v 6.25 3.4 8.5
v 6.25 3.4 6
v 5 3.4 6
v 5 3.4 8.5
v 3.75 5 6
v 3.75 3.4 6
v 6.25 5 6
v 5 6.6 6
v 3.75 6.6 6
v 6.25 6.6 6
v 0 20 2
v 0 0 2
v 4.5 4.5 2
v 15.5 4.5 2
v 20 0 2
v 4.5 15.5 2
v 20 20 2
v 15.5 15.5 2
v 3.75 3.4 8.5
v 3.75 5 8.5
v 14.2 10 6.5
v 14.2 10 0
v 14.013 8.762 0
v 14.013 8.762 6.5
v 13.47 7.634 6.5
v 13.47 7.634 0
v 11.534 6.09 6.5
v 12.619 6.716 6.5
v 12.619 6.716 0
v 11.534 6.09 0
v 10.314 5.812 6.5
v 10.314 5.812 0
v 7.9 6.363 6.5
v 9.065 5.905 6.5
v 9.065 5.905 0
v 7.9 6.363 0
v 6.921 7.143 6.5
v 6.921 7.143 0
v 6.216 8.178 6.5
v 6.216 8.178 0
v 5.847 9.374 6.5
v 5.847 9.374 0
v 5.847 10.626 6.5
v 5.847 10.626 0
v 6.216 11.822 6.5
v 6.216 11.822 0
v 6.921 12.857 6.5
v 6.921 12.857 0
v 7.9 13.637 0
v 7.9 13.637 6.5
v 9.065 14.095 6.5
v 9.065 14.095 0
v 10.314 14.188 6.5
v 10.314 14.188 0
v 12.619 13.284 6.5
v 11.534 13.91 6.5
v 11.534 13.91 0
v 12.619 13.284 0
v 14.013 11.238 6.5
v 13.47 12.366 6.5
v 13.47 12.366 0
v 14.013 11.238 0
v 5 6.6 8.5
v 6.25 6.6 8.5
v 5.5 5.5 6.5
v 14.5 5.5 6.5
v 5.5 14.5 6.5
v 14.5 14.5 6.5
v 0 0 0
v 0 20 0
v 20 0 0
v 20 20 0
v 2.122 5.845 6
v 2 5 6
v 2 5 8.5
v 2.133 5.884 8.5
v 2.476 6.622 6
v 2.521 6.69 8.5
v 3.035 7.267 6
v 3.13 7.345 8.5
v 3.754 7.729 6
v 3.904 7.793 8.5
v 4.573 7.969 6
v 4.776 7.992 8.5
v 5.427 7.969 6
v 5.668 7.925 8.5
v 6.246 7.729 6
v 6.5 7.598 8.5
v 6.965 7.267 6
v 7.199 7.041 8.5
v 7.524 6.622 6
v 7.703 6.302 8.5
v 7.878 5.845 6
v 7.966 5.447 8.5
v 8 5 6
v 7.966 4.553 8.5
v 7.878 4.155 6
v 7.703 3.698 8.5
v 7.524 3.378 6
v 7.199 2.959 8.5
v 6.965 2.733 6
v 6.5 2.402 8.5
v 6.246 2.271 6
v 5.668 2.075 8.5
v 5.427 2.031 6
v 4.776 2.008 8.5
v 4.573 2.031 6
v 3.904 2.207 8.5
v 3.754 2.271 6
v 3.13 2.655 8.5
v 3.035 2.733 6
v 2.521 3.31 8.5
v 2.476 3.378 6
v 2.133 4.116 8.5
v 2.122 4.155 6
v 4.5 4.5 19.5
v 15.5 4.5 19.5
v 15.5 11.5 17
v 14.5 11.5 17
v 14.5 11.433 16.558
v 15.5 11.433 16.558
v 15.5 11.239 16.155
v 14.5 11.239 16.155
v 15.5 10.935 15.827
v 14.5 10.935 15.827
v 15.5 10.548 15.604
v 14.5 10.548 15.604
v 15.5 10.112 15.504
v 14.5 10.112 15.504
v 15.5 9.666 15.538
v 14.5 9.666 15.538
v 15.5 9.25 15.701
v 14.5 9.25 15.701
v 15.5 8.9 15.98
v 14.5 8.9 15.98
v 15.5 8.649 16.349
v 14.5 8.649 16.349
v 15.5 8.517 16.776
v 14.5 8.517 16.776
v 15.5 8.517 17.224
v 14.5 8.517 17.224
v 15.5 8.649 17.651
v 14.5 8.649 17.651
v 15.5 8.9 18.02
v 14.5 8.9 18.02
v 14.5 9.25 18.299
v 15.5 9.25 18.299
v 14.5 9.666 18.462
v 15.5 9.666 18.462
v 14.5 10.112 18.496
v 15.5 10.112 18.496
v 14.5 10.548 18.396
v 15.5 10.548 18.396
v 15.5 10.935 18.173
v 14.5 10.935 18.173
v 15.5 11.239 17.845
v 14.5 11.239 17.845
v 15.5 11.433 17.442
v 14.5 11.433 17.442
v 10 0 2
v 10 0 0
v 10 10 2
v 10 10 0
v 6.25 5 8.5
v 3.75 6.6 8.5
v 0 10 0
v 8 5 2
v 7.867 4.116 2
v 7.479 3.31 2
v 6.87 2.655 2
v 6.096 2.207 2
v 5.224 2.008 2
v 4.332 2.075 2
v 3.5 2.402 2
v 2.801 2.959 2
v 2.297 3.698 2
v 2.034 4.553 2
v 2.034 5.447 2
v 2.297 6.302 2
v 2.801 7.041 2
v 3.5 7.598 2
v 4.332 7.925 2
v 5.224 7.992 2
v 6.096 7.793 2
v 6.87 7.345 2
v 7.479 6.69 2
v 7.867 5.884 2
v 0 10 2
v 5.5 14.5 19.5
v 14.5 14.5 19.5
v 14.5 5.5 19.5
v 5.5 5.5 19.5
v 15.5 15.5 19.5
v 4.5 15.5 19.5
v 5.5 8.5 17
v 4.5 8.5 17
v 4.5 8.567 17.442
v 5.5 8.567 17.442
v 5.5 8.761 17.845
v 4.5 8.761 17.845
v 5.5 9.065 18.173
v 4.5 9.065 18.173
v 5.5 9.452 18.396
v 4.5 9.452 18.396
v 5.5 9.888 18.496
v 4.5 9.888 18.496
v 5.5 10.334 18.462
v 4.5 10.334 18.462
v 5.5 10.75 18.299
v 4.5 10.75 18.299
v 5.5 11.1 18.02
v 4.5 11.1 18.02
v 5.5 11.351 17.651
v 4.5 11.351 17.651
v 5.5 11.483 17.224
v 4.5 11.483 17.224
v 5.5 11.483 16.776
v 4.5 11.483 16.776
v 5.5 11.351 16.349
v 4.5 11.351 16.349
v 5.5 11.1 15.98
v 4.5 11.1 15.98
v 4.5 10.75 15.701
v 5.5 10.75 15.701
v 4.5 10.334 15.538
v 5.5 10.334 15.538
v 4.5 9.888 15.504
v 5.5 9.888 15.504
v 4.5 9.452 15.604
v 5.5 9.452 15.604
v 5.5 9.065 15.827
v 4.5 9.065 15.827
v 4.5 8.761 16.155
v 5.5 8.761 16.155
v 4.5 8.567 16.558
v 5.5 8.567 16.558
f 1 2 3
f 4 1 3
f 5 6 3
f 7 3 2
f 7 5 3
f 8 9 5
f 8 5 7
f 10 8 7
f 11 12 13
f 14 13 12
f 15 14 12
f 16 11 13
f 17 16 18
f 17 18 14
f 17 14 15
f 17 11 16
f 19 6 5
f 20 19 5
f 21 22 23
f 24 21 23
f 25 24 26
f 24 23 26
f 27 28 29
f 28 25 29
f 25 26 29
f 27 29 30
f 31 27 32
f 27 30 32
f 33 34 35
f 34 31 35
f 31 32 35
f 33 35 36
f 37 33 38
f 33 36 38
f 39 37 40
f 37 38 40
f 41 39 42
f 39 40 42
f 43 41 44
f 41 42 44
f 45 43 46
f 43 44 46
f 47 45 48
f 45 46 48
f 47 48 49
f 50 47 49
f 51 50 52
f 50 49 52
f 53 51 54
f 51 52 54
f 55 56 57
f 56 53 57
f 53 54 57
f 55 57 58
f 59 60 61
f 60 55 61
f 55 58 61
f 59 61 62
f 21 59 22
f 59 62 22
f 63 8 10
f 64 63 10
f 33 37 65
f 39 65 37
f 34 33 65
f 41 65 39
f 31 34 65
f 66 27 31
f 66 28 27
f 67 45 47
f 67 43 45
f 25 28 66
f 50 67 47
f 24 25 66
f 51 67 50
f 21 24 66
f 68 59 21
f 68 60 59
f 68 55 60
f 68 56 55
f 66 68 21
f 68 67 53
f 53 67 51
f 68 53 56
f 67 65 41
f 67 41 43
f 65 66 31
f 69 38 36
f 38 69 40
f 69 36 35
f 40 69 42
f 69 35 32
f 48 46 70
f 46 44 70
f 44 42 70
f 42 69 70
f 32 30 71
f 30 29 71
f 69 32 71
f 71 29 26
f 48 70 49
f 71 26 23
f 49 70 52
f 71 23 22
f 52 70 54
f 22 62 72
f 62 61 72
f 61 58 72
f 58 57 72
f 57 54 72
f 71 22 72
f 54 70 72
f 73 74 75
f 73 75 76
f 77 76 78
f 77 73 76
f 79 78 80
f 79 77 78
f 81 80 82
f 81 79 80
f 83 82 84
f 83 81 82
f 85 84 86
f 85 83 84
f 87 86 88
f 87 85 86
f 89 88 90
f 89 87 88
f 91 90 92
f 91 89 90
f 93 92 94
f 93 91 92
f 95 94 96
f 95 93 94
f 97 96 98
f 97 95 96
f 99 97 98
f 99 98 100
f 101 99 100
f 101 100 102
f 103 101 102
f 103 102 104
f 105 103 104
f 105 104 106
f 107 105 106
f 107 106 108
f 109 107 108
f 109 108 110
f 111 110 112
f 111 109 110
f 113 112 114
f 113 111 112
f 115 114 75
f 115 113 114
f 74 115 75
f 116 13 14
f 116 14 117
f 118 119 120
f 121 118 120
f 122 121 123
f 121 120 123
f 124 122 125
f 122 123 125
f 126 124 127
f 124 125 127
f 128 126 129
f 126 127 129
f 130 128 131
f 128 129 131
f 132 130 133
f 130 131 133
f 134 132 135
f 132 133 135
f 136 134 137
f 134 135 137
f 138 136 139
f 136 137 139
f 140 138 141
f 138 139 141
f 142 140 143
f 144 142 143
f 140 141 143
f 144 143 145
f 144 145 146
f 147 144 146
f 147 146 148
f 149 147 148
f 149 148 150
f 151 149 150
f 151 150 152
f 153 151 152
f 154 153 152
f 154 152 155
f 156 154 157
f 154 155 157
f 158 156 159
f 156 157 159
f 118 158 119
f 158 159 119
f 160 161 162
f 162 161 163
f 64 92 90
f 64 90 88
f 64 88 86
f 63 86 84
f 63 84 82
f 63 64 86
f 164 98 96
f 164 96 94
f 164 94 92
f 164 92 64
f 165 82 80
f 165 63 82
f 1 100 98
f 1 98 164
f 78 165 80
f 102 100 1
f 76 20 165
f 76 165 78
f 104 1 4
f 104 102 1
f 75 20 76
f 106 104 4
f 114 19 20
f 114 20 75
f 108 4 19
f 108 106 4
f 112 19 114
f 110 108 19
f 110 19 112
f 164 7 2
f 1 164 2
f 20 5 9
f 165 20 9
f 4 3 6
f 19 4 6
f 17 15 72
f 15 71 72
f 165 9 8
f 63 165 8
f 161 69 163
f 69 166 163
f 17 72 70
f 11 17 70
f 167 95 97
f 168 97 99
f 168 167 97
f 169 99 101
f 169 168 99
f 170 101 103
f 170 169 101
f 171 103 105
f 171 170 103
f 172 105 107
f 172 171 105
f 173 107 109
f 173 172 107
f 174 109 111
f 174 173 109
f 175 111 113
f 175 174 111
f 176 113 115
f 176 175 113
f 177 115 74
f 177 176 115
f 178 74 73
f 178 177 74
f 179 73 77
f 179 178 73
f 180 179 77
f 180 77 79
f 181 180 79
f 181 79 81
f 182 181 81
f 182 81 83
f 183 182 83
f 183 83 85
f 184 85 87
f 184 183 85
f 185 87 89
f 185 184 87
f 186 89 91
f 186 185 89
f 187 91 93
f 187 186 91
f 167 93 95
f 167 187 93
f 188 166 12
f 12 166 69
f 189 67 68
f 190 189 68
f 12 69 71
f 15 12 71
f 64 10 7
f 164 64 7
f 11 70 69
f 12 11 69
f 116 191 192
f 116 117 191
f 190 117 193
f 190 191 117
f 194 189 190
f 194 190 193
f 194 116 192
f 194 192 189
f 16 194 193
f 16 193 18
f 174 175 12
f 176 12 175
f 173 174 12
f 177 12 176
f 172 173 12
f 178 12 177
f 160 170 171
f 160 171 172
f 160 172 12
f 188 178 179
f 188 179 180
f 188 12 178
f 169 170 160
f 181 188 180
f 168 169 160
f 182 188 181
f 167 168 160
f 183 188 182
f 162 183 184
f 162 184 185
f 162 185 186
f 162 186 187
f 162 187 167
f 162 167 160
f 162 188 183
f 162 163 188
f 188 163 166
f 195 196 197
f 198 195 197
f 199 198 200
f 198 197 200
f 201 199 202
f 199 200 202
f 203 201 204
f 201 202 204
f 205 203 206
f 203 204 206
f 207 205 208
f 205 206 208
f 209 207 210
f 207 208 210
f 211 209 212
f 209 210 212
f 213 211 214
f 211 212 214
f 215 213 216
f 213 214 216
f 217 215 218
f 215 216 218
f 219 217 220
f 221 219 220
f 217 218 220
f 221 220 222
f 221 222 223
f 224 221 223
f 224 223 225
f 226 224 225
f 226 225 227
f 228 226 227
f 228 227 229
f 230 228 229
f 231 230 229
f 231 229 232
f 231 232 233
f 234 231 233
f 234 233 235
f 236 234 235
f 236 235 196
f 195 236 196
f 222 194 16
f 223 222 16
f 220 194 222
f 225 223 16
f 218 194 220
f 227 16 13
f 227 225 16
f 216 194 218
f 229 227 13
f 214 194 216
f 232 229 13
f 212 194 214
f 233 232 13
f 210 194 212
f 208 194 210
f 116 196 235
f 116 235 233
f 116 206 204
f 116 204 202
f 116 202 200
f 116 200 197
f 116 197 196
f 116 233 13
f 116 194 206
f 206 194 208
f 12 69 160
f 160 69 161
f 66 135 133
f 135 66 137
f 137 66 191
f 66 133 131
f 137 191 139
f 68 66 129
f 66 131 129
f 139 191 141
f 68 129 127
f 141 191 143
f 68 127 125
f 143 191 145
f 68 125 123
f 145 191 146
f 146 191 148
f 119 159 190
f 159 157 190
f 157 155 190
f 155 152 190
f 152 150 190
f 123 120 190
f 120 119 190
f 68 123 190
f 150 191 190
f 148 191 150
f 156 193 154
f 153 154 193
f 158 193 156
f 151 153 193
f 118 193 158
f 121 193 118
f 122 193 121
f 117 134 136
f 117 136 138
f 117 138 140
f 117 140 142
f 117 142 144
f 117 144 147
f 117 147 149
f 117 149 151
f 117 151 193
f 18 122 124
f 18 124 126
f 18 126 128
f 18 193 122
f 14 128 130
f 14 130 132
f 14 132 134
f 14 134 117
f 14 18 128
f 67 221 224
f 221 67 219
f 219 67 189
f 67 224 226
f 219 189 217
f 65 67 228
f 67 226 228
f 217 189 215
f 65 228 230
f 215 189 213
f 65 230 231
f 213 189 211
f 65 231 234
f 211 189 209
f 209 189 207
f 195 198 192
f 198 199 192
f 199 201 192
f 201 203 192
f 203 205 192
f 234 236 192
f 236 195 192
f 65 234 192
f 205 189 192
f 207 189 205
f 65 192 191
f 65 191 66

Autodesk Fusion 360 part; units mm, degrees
sketch "Sketch1" plane through (0, 0, 0) normal (0, 0, 1) x (1, 0, 0)
  line L0 (0, 0) -> (10, 0)
  line L1 (10, 0) -> (10, 10)
  line L2 (10, 10) -> (0, 10)
  line L3 (0, 10) -> (0, 0)
  circle A0 centre (5, 5) radius 3
  dimension "d1" = 10
  dimension "d2" = 10
  dimension "d3" = 6
extrude "Extrude1" add sketch "Sketch1" along normal blind 2 contours L0 L1 L2 L3 | A0 makes body 1
extrude "Extrude2" add sketch "Sketch1" along normal blind 6 contours A0 bodies 1
sketch "Sketch2" plane through (0, 0, 6) normal (0, 0, 1) x (-1, 0, 0)
  circle A0 centre (-5, -5) radius 3
  line L0 (-5, -5) -> (-6.25, -5)
  line L1 (-6.25, -5) -> (-6.25, -3.4)
  line L2 (-6.25, -3.4) -> (-5, -3.4)
  line L3 (-5, -3.4) -> (-5, -5)
  line L4 (-5, -5) -> (-3.75, -5)
  line L5 (-3.75, -5) -> (-3.75, -6.6)
  line L6 (-3.75, -6.6) -> (-5, -6.6)
  line L7 (-5, -6.6) -> (-5, -5)
  line L8 (-3.75, -6.6) -> (-6.25, -6.6)
  line L9 (-6.25, -6.6) -> (-6.25, -3.4)
  line L10 (-6.25, -3.4) -> (-3.75, -3.4)
  line L11 (-3.75, -3.4) -> (-3.75, -6.6)
  dimension "d8" = 1.25
  dimension "d9" = 1.6
  dimension "d10" = 1.6
extrude "Extrude3" add sketch "Sketch2" along normal blind 2.5 bodies 1
copy_body "Body->Comp1" bodies 1 removing the originals makes body 2 in component "Button"
sketch "Sketch1 (2)" plane through (0, 0, 0) normal (0, 0, 1) x (1, 0, 0) in component "Top"
  line L0 (0, 0) -> (20, 0)
  line L1 (20, 0) -> (20, 20)
  line L2 (20, 20) -> (0, 20)
  line L3 (0, 20) -> (0, 0)
  circle A0 centre (10, 10) radius 4.2
  line L4 (5.5, 14.5) -> (14.5, 14.5)
  line L5 (14.5, 14.5) -> (14.5, 5.5)
  line L6 (14.5, 5.5) -> (5.5, 5.5)
  line L7 (5.5, 5.5) -> (5.5, 14.5)
  line L8 (4.5, 15.5) -> (15.5, 15.5)
  line L9 (15.5, 15.5) -> (15.5, 4.5)
  line L10 (15.5, 4.5) -> (4.5, 4.5)
  line L11 (4.5, 4.5) -> (4.5, 15.5)
  dimension "d13" = 20
  dimension "d14" = 20
  dimension "d15" = 8.4
  dimension "d16" = 9
  dimension "d17" = 9
  dimension "d18" = 5.5
  dimension "d19" = 5.5
  dimension "d20" = 1
  dimension "d21" = 1
  dimension "d22" = 1
  dimension "d23" = 1
extrude "Extrude1'" add sketch "Sketch1 (2)" along normal blind 2 separate body makes body 3 at (1.5, 11.8333, 0) makes body 4 at (14.1948, 9.7906, 1.3333) in component "Top"
extrude "Extrude2'" add sketch "Sketch1 (2)" along normal blind 15.5 contours L8 L9 L10 L11 bodies 3 4 in component "Top"
extrude "Extrude3'" add 1 faces at (6.6008, 6.4532, 2) along direction (0, 0, 1) blind 4 on bodies 3 bodies 3 in component "Top"
extrude "Extrude4" add 1 faces at (6.6008, 6.4532, 6) along direction (0, 0, 1) blind 0.5 on bodies 3 bodies 3 in component "Top"
sketch "Sketch2 (2)" plane through (0, 0, 0) normal (0, 0, 1) x (1, 0, 0) in component "Top"
  line L0 (-25, 15) -> (-11.6, 15)
  line L1 (-11.6, 15) -> (-11.6, 1.6)
  line L2 (-11.6, 1.6) -> (-25, 1.6)
  line L3 (-25, 1.6) -> (-25, 15)
  line L4 (-24, 14) -> (-12.6, 14)
  line L5 (-12.6, 14) -> (-12.6, 2.6)
  line L6 (-12.6, 2.6) -> (-24, 2.6)
  line L7 (-24, 2.6) -> (-24, 14)
  line L8 (-22.8, 3.8) -> (-13.8, 3.8)
  line L9 (-13.8, 3.8) -> (-13.8, 12.8)
  line L10 (-13.8, 12.8) -> (-22.8, 12.8)
  line L11 (-22.8, 12.8) -> (-22.8, 3.8)
  line L12 (-13.8, 12.8) -> (-16.8, 12.8)
  line L13 (-16.8, 12.8) -> (-16.8, 7.8)
  line L14 (-16.8, 7.8) -> (-13.8, 7.8)
  line L15 (-13.8, 7.8) -> (-13.8, 12.8)
  dimension "d32" = 13.4
  dimension "d33" = 13.4
  dimension "d34" = 11.4
  dimension "d35" = 11.4
  dimension "d36" = 9
  dimension "d37" = 9
  dimension "d38" = 1.2
  dimension "d39" = 1.2
  dimension "d40" = 3
  dimension "d41" = 5
sketch "Sketch3" plane through (4.5, 0, 0) normal (-1, 0, 0) x (0, -1, 0) in component "Top"
  line L0 (-15.5, 2) -> (-4.5, 2)
  line L1 (-4.5, 2) -> (-4.5, 15.5)
  line L2 (-4.5, 15.5) -> (-15.5, 15.5)
  line L3 (-15.5, 15.5) -> (-15.5, 2)
  line L4 (-15.5, 15.5) -> (-4.5, 15.5)
  line L5 (-4.5, 15.5) -> (-4.5, 19.5)
  line L6 (-4.5, 19.5) -> (-15.5, 19.5)
  line L7 (-15.5, 19.5) -> (-15.5, 15.5)
  circle A0 centre (-10, 17) radius 1.5
  dimension "d46" = 4
  dimension "d47" = 3
extrude "Extrude7" add sketch "Sketch3" against normal blind 1 contours L2 L4 L5 L6 L7 bodies 3 in component "Top"
sketch "Sketch4" plane through (5.5, 0, 0) normal (1, 0, 0) x (0, 1, 0) in component "Top"
  line L0 (5.5, 15.5) -> (5.5, 6.5)
  line L1 (5.5, 6.5) -> (14.5, 6.5)
  line L2 (14.5, 6.5) -> (14.5, 15.5)
  line L3 (14.5, 15.5) -> (15.5, 15.5)
  line L4 (15.5, 15.5) -> (15.5, 19.5)
  line L5 (15.5, 19.5) -> (4.5, 19.5)
  line L6 (4.5, 19.5) -> (4.5, 15.5)
  line L7 (4.5, 15.5) -> (5.5, 15.5)
  circle A0 centre (10, 17) radius 1.5
  line L8 (4.5, 19.5) -> (5.5, 19.5)
  line L9 (5.5, 19.5) -> (5.5, 15.5)
  line L10 (5.5, 15.5) -> (4.5, 15.5)
  line L11 (4.5, 15.5) -> (4.5, 19.5)
  line L12 (15.5, 19.5) -> (14.5, 19.5)
  line L13 (14.5, 19.5) -> (14.5, 15.5)
  line L14 (14.5, 15.5) -> (15.5, 15.5)
  line L15 (15.5, 15.5) -> (15.5, 19.5)
  dimension "d50" = 1
  dimension "d51" = 4
extrude "Extrude8" add sketch "Sketch4" along normal blind 9 contours L5 L6 L7 L8 L9 L10 L11 | L3 L4 L5 L12 L13 L14 L15 bodies 3 in component "Top"
sketch "Sketch5" plane through (14.5, 0, 0) normal (1, 0, 0) x (0, 1, 0) in component "Top"
  line L0 (4.5, 15.5) -> (5.5, 15.5)
  line L1 (5.5, 15.5) -> (5.5, 19.5)
  line L2 (5.5, 19.5) -> (4.5, 19.5)
  line L3 (4.5, 19.5) -> (4.5, 15.5)
  line L4 (4.5, 19.5) -> (15.5, 19.5)
  line L5 (15.5, 19.5) -> (15.5, 15.5)
  line L6 (15.5, 15.5) -> (4.5, 15.5)
  line L7 (4.5, 15.5) -> (4.5, 19.5)
  circle A0 centre (10, 17) radius 1.5
  dimension "d54" = 3
extrude "Extrude9" add sketch "Sketch5" along normal blind 1 bodies 3 in component "Top"
component "Button" placed x (1, 0, 0) y (0, 1, 0) z (0, 0, 1) at (0, 0, 0)
component "Top" placed x (1, 0, 0) y (0, 1, 0) z (0, 0, 1) at (0, 0, 0)
